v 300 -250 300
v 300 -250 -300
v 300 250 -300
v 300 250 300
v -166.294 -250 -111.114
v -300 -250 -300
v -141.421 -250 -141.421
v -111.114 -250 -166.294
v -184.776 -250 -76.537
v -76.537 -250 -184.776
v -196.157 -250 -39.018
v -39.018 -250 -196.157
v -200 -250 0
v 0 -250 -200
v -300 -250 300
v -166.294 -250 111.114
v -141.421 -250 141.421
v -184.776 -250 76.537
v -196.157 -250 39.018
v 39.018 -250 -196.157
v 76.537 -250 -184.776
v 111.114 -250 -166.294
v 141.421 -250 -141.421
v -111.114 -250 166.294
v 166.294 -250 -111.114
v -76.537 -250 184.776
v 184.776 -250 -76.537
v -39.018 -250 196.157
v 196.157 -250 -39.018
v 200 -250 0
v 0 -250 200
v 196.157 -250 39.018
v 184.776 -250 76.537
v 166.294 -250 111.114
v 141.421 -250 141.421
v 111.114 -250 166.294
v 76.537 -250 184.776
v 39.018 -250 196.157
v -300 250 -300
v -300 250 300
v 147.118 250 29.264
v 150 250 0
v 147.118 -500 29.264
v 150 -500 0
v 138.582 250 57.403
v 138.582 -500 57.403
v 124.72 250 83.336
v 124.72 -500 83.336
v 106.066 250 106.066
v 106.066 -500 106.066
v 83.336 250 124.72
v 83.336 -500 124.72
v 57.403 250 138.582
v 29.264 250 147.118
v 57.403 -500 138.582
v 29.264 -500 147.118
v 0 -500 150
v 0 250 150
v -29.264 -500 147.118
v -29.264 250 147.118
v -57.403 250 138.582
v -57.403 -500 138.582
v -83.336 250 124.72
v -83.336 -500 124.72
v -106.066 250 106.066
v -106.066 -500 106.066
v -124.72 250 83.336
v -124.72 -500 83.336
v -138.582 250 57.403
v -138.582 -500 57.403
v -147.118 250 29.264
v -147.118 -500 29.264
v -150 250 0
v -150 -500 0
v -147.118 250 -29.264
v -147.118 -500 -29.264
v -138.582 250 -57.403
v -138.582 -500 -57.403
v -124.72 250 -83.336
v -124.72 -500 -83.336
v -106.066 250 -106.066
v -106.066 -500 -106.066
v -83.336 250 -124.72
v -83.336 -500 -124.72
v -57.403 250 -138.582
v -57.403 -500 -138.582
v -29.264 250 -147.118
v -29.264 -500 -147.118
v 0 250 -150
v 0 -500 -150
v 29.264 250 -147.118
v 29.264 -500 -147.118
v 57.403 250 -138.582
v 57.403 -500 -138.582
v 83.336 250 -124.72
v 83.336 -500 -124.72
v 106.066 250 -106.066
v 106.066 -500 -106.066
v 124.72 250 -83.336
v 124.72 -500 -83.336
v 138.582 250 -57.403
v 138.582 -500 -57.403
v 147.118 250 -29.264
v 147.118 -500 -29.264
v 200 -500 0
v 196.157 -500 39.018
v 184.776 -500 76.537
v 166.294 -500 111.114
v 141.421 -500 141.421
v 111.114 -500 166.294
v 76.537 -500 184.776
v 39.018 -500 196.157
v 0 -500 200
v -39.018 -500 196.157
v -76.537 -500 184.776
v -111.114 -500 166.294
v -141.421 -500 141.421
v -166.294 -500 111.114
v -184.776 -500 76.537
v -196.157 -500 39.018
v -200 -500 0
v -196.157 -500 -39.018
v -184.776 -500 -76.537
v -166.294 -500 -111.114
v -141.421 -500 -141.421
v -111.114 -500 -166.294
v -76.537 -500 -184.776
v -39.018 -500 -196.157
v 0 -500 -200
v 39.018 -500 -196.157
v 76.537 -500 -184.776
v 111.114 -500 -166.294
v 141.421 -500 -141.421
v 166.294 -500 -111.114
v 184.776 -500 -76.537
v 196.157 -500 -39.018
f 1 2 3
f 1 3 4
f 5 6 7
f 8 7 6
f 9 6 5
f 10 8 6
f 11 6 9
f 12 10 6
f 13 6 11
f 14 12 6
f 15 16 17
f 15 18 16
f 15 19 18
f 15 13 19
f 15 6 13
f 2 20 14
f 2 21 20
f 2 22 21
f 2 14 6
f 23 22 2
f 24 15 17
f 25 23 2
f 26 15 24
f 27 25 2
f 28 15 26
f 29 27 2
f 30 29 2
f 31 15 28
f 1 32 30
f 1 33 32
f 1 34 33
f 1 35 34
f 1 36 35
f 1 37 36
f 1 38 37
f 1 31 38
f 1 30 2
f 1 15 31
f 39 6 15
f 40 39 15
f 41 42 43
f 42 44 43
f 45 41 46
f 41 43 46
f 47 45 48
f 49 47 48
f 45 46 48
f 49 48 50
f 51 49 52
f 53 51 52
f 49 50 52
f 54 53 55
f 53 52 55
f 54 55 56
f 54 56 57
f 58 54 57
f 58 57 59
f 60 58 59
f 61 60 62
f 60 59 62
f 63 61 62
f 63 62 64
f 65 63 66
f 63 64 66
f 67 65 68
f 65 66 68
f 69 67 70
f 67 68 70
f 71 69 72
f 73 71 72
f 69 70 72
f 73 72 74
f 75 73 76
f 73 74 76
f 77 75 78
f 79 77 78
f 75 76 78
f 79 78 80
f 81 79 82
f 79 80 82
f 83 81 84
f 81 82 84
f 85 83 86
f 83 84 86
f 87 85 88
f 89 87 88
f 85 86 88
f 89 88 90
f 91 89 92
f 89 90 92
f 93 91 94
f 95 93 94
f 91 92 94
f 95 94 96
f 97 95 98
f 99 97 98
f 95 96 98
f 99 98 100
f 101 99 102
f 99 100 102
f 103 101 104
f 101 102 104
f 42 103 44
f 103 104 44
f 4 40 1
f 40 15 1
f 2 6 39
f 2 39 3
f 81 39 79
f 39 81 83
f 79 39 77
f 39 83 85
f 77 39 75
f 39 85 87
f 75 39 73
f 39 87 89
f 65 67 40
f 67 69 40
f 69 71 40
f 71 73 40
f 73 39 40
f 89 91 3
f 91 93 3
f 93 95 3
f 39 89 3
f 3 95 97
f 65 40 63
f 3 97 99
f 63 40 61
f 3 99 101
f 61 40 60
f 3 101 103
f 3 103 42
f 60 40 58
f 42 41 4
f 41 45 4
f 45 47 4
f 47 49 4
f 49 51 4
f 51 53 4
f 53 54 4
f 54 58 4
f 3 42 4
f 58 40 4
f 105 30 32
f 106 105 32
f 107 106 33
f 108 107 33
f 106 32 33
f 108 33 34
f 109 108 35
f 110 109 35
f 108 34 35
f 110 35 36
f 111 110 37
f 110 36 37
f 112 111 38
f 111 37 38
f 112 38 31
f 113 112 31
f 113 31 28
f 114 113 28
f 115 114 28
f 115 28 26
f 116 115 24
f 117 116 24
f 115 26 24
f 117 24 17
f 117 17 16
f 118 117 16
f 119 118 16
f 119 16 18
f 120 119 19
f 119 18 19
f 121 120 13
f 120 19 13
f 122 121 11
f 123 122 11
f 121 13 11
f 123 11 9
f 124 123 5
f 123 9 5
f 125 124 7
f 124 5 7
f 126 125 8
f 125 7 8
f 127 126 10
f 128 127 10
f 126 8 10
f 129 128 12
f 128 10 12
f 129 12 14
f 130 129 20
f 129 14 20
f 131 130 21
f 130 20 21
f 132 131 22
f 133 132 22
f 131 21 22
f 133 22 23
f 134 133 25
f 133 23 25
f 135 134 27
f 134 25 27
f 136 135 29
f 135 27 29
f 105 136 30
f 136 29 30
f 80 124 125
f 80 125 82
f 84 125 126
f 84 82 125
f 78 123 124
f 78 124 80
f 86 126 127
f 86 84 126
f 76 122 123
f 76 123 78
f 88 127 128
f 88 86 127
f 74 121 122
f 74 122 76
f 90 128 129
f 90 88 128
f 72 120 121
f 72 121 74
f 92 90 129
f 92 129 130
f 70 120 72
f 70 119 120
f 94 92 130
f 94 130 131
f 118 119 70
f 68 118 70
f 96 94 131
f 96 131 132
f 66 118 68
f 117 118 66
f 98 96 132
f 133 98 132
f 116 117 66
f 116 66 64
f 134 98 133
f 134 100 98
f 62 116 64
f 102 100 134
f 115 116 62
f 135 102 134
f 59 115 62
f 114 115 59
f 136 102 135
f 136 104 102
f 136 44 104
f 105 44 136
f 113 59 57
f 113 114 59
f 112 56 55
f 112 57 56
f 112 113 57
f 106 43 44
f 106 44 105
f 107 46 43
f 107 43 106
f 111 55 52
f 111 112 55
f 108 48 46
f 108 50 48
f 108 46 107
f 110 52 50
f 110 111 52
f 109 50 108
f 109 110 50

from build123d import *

# Parameters (mm, degrees)
F0_W     = 600
F0_H     = 600
F1_DEPTH = 250
F2_R     = 200
F2_R_2   = 150
F3_DEPTH = 250
F4_R     = 150
F5_DEPTH = 1016


with BuildPart() as f1:
    # F0 (on Front) → F1 (new body, symmetric)
    with BuildSketch(Plane.XZ):
        Rectangle(F0_W, F0_H)
    extrude(amount=F1_DEPTH, both=True)

    # F2 (on face) → F3 (join)
    with BuildSketch(Plane.XZ.offset(250)):
        Circle(F2_R)
        Circle(F2_R_2, mode=Mode.SUBTRACT)
    extrude(amount=F3_DEPTH)

    # F4 (on face) → F5 (cut)
    with BuildSketch(Plane.XZ.offset(500)):
        Circle(F4_R)
    extrude(amount=-F5_DEPTH, mode=Mode.SUBTRACT)


solid = f1.part
